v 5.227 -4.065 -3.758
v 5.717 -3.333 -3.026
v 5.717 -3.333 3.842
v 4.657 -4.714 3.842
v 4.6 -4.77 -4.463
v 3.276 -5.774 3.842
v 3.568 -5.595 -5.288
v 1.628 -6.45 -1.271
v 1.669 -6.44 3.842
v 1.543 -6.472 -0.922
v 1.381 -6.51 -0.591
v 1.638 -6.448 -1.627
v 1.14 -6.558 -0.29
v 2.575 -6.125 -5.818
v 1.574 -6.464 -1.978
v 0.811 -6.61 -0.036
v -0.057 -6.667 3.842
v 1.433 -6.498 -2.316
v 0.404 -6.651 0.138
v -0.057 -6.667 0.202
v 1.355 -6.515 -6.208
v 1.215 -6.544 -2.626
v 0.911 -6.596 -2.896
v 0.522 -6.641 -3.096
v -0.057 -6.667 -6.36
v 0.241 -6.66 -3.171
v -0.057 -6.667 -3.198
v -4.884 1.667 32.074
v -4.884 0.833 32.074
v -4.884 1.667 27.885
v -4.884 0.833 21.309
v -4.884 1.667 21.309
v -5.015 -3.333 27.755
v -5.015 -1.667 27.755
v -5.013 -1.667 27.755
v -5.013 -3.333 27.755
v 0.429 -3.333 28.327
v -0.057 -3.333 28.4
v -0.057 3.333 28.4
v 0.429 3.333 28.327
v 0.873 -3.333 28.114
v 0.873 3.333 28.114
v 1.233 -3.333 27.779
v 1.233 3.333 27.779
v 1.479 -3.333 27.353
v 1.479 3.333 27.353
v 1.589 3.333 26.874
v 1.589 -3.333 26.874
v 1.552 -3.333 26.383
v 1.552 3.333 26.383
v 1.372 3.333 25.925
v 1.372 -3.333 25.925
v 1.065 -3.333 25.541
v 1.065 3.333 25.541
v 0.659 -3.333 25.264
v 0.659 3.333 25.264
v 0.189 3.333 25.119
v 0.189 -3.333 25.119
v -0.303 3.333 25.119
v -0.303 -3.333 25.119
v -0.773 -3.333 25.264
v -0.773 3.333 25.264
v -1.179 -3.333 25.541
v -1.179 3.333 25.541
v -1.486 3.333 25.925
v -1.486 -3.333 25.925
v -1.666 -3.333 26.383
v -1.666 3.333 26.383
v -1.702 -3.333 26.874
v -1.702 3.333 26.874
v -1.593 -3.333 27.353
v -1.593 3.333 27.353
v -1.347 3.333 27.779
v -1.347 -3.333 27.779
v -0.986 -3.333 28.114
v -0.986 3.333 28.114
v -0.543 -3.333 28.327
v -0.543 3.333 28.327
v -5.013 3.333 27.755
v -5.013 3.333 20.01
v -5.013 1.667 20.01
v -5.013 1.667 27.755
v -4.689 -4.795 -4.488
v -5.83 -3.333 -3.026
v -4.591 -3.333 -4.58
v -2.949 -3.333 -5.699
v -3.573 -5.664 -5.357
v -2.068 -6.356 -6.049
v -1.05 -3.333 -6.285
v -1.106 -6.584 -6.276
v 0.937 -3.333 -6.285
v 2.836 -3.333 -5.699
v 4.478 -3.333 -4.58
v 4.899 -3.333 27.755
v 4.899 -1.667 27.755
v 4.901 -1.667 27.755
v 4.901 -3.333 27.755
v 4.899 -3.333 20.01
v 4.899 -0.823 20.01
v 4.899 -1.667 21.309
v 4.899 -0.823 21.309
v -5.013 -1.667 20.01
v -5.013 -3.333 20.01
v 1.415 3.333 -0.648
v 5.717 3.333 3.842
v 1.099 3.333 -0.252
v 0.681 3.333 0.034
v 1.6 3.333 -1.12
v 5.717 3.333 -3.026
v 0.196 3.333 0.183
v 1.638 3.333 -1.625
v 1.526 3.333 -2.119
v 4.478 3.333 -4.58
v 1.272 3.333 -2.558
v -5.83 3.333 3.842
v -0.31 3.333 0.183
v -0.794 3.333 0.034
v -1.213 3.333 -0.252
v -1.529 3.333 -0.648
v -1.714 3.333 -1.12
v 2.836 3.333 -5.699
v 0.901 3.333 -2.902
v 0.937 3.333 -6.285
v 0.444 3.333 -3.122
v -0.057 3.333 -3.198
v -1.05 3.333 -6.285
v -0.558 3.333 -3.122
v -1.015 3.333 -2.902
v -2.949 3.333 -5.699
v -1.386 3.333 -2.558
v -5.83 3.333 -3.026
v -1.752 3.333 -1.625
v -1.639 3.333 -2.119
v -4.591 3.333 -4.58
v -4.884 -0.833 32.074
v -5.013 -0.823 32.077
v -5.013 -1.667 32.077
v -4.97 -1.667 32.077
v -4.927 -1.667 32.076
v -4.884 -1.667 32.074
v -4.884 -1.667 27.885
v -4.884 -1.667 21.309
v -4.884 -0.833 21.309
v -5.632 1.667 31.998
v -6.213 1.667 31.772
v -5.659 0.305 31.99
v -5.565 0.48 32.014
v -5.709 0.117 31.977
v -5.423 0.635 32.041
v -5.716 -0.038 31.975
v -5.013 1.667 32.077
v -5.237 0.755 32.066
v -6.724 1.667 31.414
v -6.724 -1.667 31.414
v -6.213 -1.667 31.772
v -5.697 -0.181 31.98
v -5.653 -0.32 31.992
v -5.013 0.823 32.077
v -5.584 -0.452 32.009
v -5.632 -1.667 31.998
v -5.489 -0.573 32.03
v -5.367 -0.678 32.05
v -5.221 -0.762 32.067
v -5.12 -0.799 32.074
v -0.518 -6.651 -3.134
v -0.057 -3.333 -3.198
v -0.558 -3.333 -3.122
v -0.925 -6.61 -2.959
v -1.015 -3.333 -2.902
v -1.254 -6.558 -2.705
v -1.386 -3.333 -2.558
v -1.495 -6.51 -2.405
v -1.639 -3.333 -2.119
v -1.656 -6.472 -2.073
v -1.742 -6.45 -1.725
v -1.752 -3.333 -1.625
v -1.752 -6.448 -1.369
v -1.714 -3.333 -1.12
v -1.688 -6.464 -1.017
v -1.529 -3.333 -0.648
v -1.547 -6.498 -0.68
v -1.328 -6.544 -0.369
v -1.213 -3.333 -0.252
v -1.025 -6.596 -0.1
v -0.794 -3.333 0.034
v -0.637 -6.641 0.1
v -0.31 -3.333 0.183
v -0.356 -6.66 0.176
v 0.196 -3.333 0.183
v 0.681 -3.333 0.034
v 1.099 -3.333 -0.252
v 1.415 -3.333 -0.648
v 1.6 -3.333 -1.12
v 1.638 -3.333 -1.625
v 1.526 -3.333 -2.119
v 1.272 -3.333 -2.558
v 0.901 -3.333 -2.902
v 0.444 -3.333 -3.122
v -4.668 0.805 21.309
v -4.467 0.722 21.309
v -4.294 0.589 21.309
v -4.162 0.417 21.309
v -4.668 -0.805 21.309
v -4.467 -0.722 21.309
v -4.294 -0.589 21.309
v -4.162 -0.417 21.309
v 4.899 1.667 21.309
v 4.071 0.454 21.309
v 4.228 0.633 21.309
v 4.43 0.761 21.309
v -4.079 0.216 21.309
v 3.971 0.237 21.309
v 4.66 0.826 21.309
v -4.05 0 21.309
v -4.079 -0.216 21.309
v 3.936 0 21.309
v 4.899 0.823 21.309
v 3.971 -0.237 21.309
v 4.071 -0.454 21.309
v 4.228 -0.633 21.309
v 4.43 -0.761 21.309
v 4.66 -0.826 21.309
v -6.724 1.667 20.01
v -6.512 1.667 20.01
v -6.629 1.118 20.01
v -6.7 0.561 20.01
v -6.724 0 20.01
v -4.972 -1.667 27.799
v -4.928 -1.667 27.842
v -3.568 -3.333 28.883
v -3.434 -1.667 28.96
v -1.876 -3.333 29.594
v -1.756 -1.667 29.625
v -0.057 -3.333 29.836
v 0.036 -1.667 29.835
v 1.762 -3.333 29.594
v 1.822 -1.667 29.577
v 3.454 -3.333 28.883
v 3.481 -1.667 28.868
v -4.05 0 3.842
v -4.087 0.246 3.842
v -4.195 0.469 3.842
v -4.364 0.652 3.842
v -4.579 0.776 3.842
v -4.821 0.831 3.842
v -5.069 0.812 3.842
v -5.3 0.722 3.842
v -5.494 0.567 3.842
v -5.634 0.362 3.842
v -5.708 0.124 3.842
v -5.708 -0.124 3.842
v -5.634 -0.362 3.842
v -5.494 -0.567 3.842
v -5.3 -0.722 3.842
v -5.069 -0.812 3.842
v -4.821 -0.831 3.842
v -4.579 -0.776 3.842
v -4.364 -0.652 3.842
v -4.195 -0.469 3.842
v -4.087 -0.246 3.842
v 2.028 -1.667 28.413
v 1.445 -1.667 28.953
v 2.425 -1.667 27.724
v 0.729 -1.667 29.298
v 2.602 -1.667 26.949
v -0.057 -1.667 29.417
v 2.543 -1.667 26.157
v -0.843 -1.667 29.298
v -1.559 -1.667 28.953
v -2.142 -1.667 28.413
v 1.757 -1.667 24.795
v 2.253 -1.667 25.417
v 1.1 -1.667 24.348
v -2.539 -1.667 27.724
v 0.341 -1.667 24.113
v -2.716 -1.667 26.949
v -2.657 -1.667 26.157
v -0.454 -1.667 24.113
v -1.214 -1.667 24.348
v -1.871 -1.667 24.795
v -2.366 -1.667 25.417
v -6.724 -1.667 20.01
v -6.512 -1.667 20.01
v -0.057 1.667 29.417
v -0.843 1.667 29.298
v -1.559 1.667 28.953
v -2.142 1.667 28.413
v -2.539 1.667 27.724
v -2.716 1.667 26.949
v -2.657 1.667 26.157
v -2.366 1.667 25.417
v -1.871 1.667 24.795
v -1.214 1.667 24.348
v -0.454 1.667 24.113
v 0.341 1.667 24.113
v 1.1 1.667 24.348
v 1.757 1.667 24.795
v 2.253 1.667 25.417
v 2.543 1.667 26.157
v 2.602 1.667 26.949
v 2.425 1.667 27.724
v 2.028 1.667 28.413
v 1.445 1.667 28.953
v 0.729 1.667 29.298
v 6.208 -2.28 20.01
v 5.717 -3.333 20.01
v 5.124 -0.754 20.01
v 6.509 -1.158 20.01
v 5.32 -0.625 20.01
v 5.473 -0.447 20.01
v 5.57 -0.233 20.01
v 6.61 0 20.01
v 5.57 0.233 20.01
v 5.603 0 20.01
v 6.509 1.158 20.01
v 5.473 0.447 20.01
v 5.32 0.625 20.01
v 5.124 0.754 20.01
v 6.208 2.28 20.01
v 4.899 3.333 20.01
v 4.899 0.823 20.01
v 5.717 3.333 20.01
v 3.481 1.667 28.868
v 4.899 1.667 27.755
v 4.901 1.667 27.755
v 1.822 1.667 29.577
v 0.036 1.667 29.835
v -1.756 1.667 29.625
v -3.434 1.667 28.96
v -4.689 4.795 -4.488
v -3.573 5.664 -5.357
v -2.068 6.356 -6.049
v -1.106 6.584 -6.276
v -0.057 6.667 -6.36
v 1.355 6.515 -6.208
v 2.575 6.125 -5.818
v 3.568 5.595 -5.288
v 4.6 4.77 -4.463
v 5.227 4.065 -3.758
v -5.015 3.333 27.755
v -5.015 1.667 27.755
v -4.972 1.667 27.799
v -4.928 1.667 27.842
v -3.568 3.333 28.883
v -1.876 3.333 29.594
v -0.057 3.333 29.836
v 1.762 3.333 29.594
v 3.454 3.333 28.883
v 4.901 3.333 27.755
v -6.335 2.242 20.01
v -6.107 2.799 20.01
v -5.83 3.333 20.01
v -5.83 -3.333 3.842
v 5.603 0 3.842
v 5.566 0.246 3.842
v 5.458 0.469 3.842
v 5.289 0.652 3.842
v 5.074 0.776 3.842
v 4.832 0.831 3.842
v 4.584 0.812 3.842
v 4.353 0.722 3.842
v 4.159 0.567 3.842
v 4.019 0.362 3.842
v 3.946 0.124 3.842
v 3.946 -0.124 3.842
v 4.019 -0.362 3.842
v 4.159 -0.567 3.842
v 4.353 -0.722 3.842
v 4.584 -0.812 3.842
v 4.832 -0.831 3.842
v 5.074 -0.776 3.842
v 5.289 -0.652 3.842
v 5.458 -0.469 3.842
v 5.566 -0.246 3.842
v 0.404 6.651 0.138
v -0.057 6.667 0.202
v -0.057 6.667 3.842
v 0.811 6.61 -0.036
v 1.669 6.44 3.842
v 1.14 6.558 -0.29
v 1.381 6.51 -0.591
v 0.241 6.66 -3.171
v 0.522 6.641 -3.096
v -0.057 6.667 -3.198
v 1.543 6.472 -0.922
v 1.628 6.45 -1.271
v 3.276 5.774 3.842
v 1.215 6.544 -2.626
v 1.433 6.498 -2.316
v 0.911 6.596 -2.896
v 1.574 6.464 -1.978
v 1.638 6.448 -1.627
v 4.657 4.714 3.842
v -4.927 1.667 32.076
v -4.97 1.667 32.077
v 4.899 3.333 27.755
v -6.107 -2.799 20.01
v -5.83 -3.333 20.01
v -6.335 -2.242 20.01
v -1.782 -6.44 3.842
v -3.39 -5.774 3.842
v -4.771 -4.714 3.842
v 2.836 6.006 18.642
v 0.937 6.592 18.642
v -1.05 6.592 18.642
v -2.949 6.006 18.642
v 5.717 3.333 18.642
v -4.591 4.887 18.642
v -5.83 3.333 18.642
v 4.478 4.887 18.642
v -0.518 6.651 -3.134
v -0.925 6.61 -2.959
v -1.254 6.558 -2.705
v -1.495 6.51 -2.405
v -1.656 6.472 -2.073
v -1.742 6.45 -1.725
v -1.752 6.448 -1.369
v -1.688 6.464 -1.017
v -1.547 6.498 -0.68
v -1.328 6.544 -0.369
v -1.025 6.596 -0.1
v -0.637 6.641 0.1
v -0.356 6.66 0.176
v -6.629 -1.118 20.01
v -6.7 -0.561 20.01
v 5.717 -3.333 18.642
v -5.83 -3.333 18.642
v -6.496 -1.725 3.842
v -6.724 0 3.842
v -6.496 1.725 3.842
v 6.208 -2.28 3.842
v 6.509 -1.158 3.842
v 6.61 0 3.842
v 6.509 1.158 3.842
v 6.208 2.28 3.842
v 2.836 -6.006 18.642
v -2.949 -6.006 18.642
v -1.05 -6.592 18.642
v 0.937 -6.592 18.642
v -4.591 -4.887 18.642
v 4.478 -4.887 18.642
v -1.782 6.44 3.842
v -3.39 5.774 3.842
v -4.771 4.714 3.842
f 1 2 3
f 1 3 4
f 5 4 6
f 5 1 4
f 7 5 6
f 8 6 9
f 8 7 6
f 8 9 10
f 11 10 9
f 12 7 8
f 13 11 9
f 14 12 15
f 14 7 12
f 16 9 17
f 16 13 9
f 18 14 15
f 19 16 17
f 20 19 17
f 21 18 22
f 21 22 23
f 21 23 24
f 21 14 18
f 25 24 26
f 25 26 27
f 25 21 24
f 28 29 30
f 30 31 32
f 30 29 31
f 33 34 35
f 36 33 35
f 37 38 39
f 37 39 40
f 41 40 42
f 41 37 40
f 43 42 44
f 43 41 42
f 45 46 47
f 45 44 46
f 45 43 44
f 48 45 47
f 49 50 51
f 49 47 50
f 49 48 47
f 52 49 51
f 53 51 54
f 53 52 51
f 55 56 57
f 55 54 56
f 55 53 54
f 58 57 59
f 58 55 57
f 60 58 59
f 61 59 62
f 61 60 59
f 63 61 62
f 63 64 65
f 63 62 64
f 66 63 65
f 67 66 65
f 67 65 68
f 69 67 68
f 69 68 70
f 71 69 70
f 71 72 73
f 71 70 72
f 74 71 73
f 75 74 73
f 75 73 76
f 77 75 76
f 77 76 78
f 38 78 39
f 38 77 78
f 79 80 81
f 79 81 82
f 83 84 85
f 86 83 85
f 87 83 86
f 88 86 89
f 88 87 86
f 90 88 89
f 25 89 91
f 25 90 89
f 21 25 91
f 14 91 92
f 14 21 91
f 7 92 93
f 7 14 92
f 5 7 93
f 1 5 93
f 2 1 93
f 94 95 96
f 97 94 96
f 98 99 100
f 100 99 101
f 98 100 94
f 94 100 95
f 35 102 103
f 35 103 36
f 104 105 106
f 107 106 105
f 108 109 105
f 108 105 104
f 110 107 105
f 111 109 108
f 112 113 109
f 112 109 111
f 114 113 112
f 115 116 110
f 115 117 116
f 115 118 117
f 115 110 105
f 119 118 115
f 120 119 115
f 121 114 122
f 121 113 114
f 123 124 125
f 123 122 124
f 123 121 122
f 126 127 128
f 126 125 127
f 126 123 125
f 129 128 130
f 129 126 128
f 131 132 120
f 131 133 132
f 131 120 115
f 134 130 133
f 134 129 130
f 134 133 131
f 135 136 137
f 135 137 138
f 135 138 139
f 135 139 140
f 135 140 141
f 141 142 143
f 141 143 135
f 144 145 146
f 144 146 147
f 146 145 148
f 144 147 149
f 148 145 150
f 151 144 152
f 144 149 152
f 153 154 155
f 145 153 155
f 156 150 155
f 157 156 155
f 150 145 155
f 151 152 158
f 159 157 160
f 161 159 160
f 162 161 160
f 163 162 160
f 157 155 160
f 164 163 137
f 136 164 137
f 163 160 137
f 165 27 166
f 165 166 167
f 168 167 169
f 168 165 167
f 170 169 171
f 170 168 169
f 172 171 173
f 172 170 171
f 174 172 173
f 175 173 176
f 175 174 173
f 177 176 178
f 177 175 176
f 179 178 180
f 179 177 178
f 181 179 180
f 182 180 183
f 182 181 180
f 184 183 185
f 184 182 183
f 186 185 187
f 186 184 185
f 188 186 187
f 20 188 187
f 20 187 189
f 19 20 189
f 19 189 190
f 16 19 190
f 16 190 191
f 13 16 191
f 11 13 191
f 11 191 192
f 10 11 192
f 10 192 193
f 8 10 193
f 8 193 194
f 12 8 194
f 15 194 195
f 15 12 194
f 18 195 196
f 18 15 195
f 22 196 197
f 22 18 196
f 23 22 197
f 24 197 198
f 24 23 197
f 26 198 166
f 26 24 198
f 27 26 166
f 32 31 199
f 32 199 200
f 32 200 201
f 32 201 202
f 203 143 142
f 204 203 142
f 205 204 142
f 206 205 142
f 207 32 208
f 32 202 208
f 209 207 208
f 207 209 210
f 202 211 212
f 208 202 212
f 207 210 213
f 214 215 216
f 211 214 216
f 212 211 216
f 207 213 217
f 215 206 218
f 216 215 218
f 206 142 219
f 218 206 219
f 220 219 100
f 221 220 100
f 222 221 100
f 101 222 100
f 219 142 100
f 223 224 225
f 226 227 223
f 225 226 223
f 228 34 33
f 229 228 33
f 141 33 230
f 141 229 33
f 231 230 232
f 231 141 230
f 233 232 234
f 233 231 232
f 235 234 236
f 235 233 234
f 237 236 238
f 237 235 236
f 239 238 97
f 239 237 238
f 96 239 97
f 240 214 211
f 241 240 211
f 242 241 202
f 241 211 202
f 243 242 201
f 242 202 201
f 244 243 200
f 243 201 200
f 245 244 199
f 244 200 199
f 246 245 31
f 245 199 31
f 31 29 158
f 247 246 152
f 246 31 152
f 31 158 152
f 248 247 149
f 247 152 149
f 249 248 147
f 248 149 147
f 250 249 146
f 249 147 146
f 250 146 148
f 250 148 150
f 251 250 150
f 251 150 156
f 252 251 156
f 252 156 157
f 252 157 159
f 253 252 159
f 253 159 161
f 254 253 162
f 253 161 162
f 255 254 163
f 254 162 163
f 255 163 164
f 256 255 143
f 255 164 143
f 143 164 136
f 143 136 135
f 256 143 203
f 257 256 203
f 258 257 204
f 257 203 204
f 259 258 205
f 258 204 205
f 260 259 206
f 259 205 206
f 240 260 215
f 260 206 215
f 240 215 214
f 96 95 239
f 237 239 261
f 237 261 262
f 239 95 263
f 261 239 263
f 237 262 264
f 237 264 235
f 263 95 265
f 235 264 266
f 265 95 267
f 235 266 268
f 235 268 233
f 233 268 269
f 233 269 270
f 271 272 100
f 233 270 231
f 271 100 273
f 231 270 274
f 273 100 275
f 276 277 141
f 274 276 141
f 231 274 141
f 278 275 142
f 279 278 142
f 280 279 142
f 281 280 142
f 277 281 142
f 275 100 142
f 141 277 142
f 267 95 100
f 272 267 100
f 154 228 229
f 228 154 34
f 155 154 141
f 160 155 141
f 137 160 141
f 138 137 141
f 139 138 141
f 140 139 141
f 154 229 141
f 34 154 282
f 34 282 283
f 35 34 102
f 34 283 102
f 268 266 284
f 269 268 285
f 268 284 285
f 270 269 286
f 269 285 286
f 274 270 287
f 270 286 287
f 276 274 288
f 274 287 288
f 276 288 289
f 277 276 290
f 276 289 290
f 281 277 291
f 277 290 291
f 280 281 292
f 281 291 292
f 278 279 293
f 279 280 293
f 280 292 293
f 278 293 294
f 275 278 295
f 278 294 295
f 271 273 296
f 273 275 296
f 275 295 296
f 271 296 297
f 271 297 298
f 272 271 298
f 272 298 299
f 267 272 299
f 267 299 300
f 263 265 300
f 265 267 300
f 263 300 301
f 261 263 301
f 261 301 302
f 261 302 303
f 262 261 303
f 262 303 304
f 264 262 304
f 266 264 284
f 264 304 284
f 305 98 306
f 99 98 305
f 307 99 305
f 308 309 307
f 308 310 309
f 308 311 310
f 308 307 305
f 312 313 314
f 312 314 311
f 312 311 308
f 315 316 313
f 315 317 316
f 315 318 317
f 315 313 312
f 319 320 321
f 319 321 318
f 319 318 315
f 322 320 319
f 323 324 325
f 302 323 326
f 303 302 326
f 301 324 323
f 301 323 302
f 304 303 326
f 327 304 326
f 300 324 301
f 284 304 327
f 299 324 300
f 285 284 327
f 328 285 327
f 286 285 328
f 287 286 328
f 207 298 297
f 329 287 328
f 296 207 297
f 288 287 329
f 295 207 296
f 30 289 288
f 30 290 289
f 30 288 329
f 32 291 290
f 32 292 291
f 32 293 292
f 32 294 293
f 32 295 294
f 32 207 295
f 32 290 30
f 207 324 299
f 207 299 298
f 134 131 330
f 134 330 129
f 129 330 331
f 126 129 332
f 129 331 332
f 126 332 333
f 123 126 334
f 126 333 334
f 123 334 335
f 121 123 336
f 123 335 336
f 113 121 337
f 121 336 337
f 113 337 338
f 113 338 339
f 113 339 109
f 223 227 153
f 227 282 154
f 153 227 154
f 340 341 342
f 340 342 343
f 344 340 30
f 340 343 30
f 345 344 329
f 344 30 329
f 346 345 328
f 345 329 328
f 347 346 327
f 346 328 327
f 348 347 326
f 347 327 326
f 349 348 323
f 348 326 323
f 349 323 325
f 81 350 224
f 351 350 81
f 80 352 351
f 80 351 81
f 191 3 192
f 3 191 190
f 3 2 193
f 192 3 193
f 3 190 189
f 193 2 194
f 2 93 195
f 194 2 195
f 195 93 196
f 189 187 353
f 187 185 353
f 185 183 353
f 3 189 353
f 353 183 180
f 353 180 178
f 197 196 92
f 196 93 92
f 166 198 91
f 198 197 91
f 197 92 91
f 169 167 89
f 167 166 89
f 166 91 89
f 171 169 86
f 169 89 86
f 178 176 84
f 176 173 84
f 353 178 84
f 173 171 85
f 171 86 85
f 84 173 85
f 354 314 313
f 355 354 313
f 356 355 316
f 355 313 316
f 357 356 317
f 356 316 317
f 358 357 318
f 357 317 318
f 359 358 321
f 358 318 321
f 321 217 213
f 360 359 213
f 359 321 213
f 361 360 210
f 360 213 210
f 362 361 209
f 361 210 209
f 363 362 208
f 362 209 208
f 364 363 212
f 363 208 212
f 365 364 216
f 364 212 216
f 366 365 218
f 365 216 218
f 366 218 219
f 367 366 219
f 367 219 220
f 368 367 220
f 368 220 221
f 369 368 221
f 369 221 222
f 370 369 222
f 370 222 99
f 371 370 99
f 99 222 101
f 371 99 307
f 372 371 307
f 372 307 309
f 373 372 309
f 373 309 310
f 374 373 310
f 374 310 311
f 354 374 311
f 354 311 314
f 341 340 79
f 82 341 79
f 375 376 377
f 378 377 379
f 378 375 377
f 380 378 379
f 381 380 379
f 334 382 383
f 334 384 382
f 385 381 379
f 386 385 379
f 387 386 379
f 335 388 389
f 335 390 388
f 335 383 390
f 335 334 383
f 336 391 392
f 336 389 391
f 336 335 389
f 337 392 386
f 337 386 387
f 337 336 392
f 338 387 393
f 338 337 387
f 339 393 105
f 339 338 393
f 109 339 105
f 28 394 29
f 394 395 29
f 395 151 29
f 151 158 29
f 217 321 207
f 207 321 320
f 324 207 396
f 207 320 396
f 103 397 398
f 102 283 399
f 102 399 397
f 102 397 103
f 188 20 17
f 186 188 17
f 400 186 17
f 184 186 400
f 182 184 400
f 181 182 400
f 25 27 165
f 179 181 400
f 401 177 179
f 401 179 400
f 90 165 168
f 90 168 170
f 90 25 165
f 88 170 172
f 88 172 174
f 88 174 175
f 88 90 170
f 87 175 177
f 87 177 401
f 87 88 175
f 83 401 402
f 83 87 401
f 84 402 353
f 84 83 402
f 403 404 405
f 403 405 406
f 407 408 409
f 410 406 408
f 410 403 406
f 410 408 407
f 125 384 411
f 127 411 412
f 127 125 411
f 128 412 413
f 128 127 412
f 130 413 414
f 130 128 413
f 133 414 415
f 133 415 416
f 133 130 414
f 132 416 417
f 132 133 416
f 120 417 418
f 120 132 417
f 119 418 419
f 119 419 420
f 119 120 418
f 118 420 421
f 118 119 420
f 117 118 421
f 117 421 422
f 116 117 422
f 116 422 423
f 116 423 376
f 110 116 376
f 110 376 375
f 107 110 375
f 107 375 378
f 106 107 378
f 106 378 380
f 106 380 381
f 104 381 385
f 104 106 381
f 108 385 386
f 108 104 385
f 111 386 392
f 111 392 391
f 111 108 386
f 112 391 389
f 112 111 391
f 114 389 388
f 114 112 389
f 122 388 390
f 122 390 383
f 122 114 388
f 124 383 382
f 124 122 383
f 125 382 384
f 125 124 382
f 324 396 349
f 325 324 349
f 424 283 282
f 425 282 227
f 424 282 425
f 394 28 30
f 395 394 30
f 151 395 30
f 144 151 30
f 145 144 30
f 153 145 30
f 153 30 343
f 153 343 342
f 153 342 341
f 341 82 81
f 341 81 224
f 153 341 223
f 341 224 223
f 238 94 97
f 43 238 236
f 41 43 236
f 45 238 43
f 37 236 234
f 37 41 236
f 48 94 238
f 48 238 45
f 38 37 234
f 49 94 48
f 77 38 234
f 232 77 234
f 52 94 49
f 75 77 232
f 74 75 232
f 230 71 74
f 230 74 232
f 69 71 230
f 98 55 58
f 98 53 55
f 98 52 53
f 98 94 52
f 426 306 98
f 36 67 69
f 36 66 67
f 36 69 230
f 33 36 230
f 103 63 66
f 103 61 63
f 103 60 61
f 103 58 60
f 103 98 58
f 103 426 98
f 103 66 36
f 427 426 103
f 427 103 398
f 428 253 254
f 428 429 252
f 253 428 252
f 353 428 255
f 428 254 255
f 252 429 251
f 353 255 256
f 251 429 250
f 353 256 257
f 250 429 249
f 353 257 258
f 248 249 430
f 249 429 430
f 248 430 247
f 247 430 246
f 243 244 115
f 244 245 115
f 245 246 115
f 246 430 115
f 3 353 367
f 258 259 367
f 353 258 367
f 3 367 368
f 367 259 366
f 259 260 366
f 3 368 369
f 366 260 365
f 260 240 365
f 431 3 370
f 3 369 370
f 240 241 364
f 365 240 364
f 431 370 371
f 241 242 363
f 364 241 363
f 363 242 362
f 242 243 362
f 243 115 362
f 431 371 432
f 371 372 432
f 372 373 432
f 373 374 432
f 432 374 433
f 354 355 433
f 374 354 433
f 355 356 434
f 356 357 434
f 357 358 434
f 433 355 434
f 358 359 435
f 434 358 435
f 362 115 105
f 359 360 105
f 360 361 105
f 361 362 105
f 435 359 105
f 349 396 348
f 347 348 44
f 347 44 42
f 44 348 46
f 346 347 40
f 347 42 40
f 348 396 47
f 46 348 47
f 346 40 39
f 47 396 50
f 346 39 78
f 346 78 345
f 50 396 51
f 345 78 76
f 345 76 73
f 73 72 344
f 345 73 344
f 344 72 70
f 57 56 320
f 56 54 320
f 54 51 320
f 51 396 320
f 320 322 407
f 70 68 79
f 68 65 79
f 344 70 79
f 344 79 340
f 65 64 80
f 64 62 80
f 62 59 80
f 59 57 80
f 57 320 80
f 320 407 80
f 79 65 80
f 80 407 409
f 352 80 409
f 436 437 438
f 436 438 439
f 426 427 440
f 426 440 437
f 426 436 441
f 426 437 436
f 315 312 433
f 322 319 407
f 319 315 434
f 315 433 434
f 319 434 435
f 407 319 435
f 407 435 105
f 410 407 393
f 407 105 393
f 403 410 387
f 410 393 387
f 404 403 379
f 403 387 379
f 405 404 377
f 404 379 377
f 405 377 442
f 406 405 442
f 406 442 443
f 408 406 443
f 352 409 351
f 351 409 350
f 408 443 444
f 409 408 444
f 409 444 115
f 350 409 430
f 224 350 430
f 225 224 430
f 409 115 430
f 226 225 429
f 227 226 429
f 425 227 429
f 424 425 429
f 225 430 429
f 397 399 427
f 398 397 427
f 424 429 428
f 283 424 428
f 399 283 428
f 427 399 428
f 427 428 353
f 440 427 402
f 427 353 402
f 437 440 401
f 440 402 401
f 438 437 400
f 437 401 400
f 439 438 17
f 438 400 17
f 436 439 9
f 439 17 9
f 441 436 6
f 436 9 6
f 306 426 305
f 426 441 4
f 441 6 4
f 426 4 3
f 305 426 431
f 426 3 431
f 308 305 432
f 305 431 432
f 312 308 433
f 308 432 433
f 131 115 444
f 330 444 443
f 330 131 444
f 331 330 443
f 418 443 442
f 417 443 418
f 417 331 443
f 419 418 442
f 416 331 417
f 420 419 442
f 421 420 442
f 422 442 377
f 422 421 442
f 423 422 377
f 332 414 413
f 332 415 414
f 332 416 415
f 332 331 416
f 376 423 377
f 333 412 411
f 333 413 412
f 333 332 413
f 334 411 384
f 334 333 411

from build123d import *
from build123d.topology import SkipClean

# Parameters (mm, degrees)
SKETCH2_R                       = 10
PHALANGE_LENGTH_DEPTH           = 26.2
BOSS_EXTRUDE3_DEPTH             = 5
BOSS_EXTRUDE4_DEPTH             = 5
BOSS_EXTRUDE4_DEPTH_BACK        = 5
CUT_EXTRUDE2_START              = -15.3025
CUT_EXTRUDE2_DEPTH              = 15.3025
SKETCH7_R                       = 1.65
CUT_EXTRUDE3_DEPTH              = 10
CUT_EXTRUDE4_DEPTH              = 2.5
CUT_EXTRUDE4_DEPTH_BACK         = 2.5
CUT_EXTRUDE7_REACH              = 47.294
SKETCH4_R                       = 1.65
CUT_EXTRUDE7_DIRECTION_2_REACH  = 47.294
CUT_EXTRUDE_THIN1_START         = 26.2
CUT_EXTRUDE_THIN1_DEPTH         = 10.361670454
BOSS_EXTRUDE5_REACH             = 46.529
SKETCH9_R                       = 4
SKETCH9_R_2                     = 1.65
CUT_EXTRUDE8_REACH              = 45.846
SKETCH10_R                      = 1.25
CUT_EXTRUDE9_START              = -4
CUT_EXTRUDE9_DEPTH              = 4
CUT_EXTRUDE10_REACH             = 46.529
CUT_EXTRUDE10_DIRECTION_2_REACH = 46.529
CUT_EXTRUDE11_START             = -10
CUT_EXTRUDE11_OUTLINE_W         = 2.565773848
CUT_EXTRUDE11_OUTLINE_H         = 11.6166929
CUT_EXTRUDE11_DEPTH             = 10
BOSS_EXTRUDE7_REACH             = 44.149
CUT_EXTRUDE12_REACH             = 45.846
SKETCH10_2_R                    = 1.25
CUT_EXTRUDE12_DIRECTION_2_REACH = 45.846
SKETCH17_R                      = 1.25
SKETCH17_W                      = 2.42123439
SKETCH17_H                      = 5
CUT_EXTRUDE14_DEPTH             = 16.148519
SCALE1_SCALE                    = 0.666666667
CUT_EXTRUDE15_START             = -10.000004
SKETCH18_R                      = 1.65
CUT_EXTRUDE15_DEPTH             = 13.333342
CUT_EXTRUDE16_START             = -3.333333
SKETCH19_R                      = 1.7
CUT_EXTRUDE16_DEPTH             = 13.333338


# Read off the part's stored shape, not the designer's step: Cut-Extrude-Thin1, Cut-Extrude11
with BuildPart() as part:
    # Sketch2 → Phalange Length (new body)
    with BuildSketch(Plane.XY):
        Circle(SKETCH2_R)
    extrude(amount=PHALANGE_LENGTH_DEPTH)

    # Sketch3 → Boss-Extrude3 (add)
    with BuildSketch(Plane(origin=(0, -10, 0), x_dir=(-1, 0, 0), z_dir=(0, -1, 0))):
        with BuildLine():
            Line((-10, 5.302499701), (-10, 0))
            Line((-10, 0), (10, 0))
            Line((10, 0), (10, 5.302499701))
            ThreePointArc((10, 5.302499701), (0, 15.302499701), (-10, 5.302499701))
        make_face()
    boss_extrude3 = extrude(amount=-BOSS_EXTRUDE3_DEPTH)

    # Mirror1: Boss-Extrude3 across plane
    add(boss_extrude3.mirror(Plane.ZX))

    # Sketch5 → Boss-Extrude4 (add, two sides: drawn at the far end of the back side and taken through both)
    with BuildSketch(Plane(origin=(0, 0, 0), x_dir=(1, 0, 0), z_dir=(0, 1, 0)).offset(-BOSS_EXTRUDE4_DEPTH_BACK)):
        with BuildLine():
            Line((-10, -31.983157911), (-10, -26.2))
            Line((-10, -26.2), (10, -26.2))
            Line((10, -26.2), (10, -31.983157911))
            ThreePointArc((10, -31.983157911), (0, -41.551984156), (-10, -31.983157911))
        make_face()
    extrude(amount=BOSS_EXTRUDE4_DEPTH + BOSS_EXTRUDE4_DEPTH_BACK)

    # Sketch6 → Cut-Extrude2 (cut)
    with SkipClean():  # the faces are left unmerged after this step: merging them gives an invalid solid
        with BuildSketch(Plane.XY.offset(CUT_EXTRUDE2_START)):
            with BuildLine():
                ThreePointArc((0, 10), (5, 8.660254038), (8.660254038, 5))
                Line((8.660254038, 5), (10, 5))
                Line((10, 5), (10, 10))
                Line((10, 10), (0, 10))
            make_face()
            with BuildLine():
                Line((10, -5), (8.660254038, -5))
                ThreePointArc((8.660254038, -5), (5, -8.660254038), (0, -10))
                Line((0, -10), (10, -10))
                Line((10, -10), (10, -5))
            make_face()
            with BuildLine():
                ThreePointArc((-8.660254038, 5), (-5, 8.660254038), (0, 10))
                Line((0, 10), (-10, 10))
                Line((-10, 10), (-10, 5))
                Line((-10, 5), (-8.660254038, 5))
            make_face()
            with BuildLine():
                Line((-10, -10), (0, -10))
                ThreePointArc((0, -10), (-5, -8.660254038), (-8.660254038, -5))
                Line((-8.660254038, -5), (-10, -5))
                Line((-10, -5), (-10, -10))
            make_face()
        extrude(amount=CUT_EXTRUDE2_DEPTH, mode=Mode.SUBTRACT)

    # Sketch7 → Cut-Extrude3 (cut)
    with SkipClean():  # the faces are left unmerged after this step: merging them gives an invalid solid
        with BuildSketch(Plane(origin=(0, 5, 0), x_dir=(1, 0, 0), z_dir=(0, 1, 0))):
            with Locations(Location((0, -34.361984156, 0), (0, 0, 270))):
                Circle(SKETCH7_R)
        extrude(amount=-CUT_EXTRUDE3_DEPTH, mode=Mode.SUBTRACT)

    # Sketch5<2> → Cut-Extrude4 (cut, two sides: drawn at the far end of the back side and taken through both)
    with BuildSketch(Plane(origin=(0, 0, 0), x_dir=(1, 0, 0), z_dir=(0, 1, 0)).offset(-CUT_EXTRUDE4_DEPTH_BACK)):
        with BuildLine():
            Line((-10, -31.983157911), (-10, -26.2))
            Line((-10, -26.2), (10, -26.2))
            Line((10, -26.2), (10, -31.983157911))
            ThreePointArc((10, -31.983157911), (0, -41.551984156), (-10, -31.983157911))
        make_face()
    extrude(amount=CUT_EXTRUDE4_DEPTH + CUT_EXTRUDE4_DEPTH_BACK, mode=Mode.SUBTRACT)

    # Sketch4 → Cut-Extrude7 (cut, up to next)
    with BuildSketch(Plane(origin=(0, -5, 0), x_dir=(1, 0, 0), z_dir=(0, 1, 0)), mode=Mode.PRIVATE) as cut_extrude7_sk1:
        with Locations(Location((0, 8.010159673, 0), (0, 0, 270))):
            Circle(SKETCH4_R)
    cut_extrude7_tool1 = extrude(cut_extrude7_sk1.sketch, amount=-CUT_EXTRUDE7_REACH, mode=Mode.PRIVATE) & part.part
    add(cut_extrude7_tool1.solids().sort_by_distance((0, -5, -8.01016))[0], mode=Mode.SUBTRACT)

    # Sketch4 → Cut-Extrude7 direction 2 (cut, up to next)
    with BuildSketch(Plane(origin=(0, -5, 0), x_dir=(1, 0, 0), z_dir=(0, 1, 0)), mode=Mode.PRIVATE) as cut_extrude7_direction_2_sk1:
        with Locations(Location((0, 8.010159673, 0), (0, 0, 270))):
            Circle(SKETCH4_R)
    cut_extrude7_direction_2_tool1 = extrude(cut_extrude7_direction_2_sk1.sketch, amount=CUT_EXTRUDE7_DIRECTION_2_REACH, mode=Mode.PRIVATE) & part.part
    add(cut_extrude7_direction_2_tool1.solids().sort_by_distance((0, -5, -8.01016))[0], mode=Mode.SUBTRACT)

    # Cut-Extrude-Thin1 outline → Cut-Extrude-Thin1 (cut)
    with SkipClean():  # the faces are left unmerged after this step: merging them gives an invalid solid
        with BuildSketch(Plane.XY.offset(CUT_EXTRUDE_THIN1_START)):
            with BuildLine():
                ThreePointArc((8.660254038, 5), (9.256147934, 3.78466979), (9.682458366, 2.5))
                Line((9.682458366, 2.5), (10, 2.5))
                Line((10, 2.5), (10, 5))
                Line((10, 5), (8.660254038, 5))
            make_face()
            with BuildLine():
                Line((10, -2.5), (9.682458366, -2.5))
                ThreePointArc((9.682458366, -2.5), (9.256147934, -3.78466979), (8.660254038, -5))
                Line((8.660254038, -5), (10, -5))
                Line((10, -5), (10, -2.5))
            make_face()
            with BuildLine():
                Line((-10, 2.5), (-9.682458366, 2.5))
                ThreePointArc((-9.682458366, 2.5), (-9.256147934, 3.78466979), (-8.660254038, 5))
                Line((-8.660254038, 5), (-10, 5))
                Line((-10, 5), (-10, 2.5))
            make_face()
            with BuildLine():
                ThreePointArc((-8.660254038, -5), (-9.256147934, -3.78466979), (-9.682458366, -2.5))
                Line((-9.682458366, -2.5), (-10, -2.5))
                Line((-10, -2.5), (-10, -5))
                Line((-10, -5), (-8.660254038, -5))
            make_face()
        extrude(amount=CUT_EXTRUDE_THIN1_DEPTH, mode=Mode.SUBTRACT)

    # Sketch9 → Boss-Extrude5 (add, up to next)
    with BuildSketch(Plane.XZ.offset(-2.5), mode=Mode.PRIVATE) as boss_extrude5_sk1:
        with Locations(Location((0, 34.361984156, 0), (0, 0, 90))):
            Circle(SKETCH9_R)
        with Locations(Location((0, 34.361984156, 0), (0, 0, 90))):
            Circle(SKETCH9_R_2, mode=Mode.SUBTRACT)
    boss_extrude5_tool1 = extrude(boss_extrude5_sk1.sketch, amount=BOSS_EXTRUDE5_REACH, mode=Mode.PRIVATE) - part.part
    add(boss_extrude5_tool1.solids().sort_by_distance((0, 2.5, 30.475121))[0])

    # Sketch10 → Cut-Extrude8 (cut, up to next)
    with BuildSketch(Plane.XY.offset(26.2), mode=Mode.PRIVATE) as cut_extrude8_sk1:
        with Locations((7.239961745, 0)):
            Circle(SKETCH10_R)
    cut_extrude8_tool1 = extrude(cut_extrude8_sk1.sketch, amount=-CUT_EXTRUDE8_REACH, mode=Mode.PRIVATE) & part.part
    # Sketch10 → Cut-Extrude8 (cut, up to next)
    with BuildSketch(Plane.XY.offset(26.2), mode=Mode.PRIVATE) as cut_extrude8_sk2:
        with Locations((-7.239961745, 0)):
            Circle(SKETCH10_R)
    cut_extrude8_tool2 = extrude(cut_extrude8_sk2.sketch, amount=-CUT_EXTRUDE8_REACH, mode=Mode.PRIVATE) & part.part
    add(cut_extrude8_tool1.solids().sort_by_distance((7.239962, 0, 26.2))[0], mode=Mode.SUBTRACT)
    add(cut_extrude8_tool2.solids().sort_by_distance((-7.239962, 0, 26.2))[0], mode=Mode.SUBTRACT)

    # Sketch11 → Cut-Extrude9 (cut)
    with SkipClean():  # the faces are left unmerged after this step: merging them gives an invalid solid
        with BuildSketch(Plane.XY.offset(26.2).offset(CUT_EXTRUDE9_START)):
            with BuildLine():
                ThreePointArc((8.660254038, 5), (0, 10), (-8.660254038, 5))
                Line((-8.660254038, 5), (8.660254038, 5))
            make_face()
            with BuildLine():
                Line((8.660254038, -5), (-8.660254038, -5))
                ThreePointArc((-8.660254038, -5), (0, -10), (8.660254038, -5))
            make_face()
        extrude(amount=CUT_EXTRUDE9_DEPTH, mode=Mode.SUBTRACT)

    # Sketch12 → Cut-Extrude10 (cut, up to next)
    with BuildSketch(Plane.XZ.offset(-2.5), mode=Mode.PRIVATE) as cut_extrude10_sk1:
        with BuildLine():
            Line((-10.033719202, 41.551984156), (-10.033719202, 34.364892021))
            Line((-10.033719202, 34.364892021), (-8.660254038, 34.364892021))
            ThreePointArc((-8.660254038, 34.364892021), (0, 38.990740593), (8.660254038, 34.364892021))
            Line((8.660254038, 34.364892021), (10.033719202, 34.364892021))
            Line((10.033719202, 34.364892021), (10.033719202, 41.551984156))
            Line((10.033719202, 41.551984156), (-10.033719202, 41.551984156))
        make_face()
    cut_extrude10_tool1 = extrude(cut_extrude10_sk1.sketch, amount=CUT_EXTRUDE10_REACH, mode=Mode.PRIVATE) & part.part
    add(cut_extrude10_tool1.solids().sort_by_distance((0, 2.5, 39.050279))[0], mode=Mode.SUBTRACT)

    # Sketch12 → Cut-Extrude10 direction 2 (cut, up to next)
    with BuildSketch(Plane.XZ.offset(-2.5), mode=Mode.PRIVATE) as cut_extrude10_direction_2_sk1:
        with BuildLine():
            Line((-10.033719202, 41.551984156), (-10.033719202, 34.364892021))
            Line((-10.033719202, 34.364892021), (-8.660254038, 34.364892021))
            ThreePointArc((-8.660254038, 34.364892021), (0, 38.990740593), (8.660254038, 34.364892021))
            Line((8.660254038, 34.364892021), (10.033719202, 34.364892021))
            Line((10.033719202, 34.364892021), (10.033719202, 41.551984156))
            Line((10.033719202, 41.551984156), (-10.033719202, 41.551984156))
        make_face()
    cut_extrude10_direction_2_tool1 = extrude(cut_extrude10_direction_2_sk1.sketch, amount=-CUT_EXTRUDE10_DIRECTION_2_REACH, mode=Mode.PRIVATE) & part.part
    add(cut_extrude10_direction_2_tool1.solids().sort_by_distance((0, 2.5, 39.050279))[0], mode=Mode.SUBTRACT)

    # Cut-Extrude11 outline → Cut-Extrude11 (cut)
    with BuildSketch(Plane.XZ.offset(5).offset(CUT_EXTRUDE11_START)):
        with Locations((-8.717113076, 30.060571369)):
            Rectangle(CUT_EXTRUDE11_OUTLINE_W, CUT_EXTRUDE11_OUTLINE_H)
        with Locations((8.717113076, 30.060571369)):
            Rectangle(CUT_EXTRUDE11_OUTLINE_W, CUT_EXTRUDE11_OUTLINE_H)
    extrude(amount=CUT_EXTRUDE11_DEPTH, mode=Mode.SUBTRACT)

    # Boss-Extrude7: up to this face of the body (flat: up to its plane)
    boss_extrude7_end = Plane(part.part.faces().sort_by_distance((0, 2.5, 26.396174341))[0])
    # Sketch16 → Boss-Extrude7 (add, up to the picked face)
    with BuildSketch(Plane(origin=(0, -2.5, 0), x_dir=(1, 0, 0), z_dir=(0, 1, 0)), mode=Mode.PRIVATE) as boss_extrude7_sk1:
        with BuildLine():
            Line((-4.818727355, -24.252224919), (-7.434226152, -24.252224919))
            Line((-7.434226152, -24.252224919), (-10, -24.252224919))
            Line((-10, -24.252224919), (-10, -41.358561033))
            ThreePointArc((-10, -41.358561033), (-8.808295471, -42.090817912), (-7.43422564, -42.352145139))
            ThreePointArc((-7.43422564, -42.352145139), (-6.033645007, -42.099721533), (-4.818727355, -41.358561033))
            Line((-4.818727355, -41.358561033), (-4.818727355, -37.809527951))
            ThreePointArc((-4.818727355, -37.809527951), (-6.204248493, -36.942230104), (-7.437080645, -35.868917819))
            Line((-7.437080645, -35.868917819), (-7.434226152, -35.868917819))
            Line((-7.434226152, -35.868917819), (-7.434226152, -26.2))
            Line((-7.434226152, -26.2), (-4.818727355, -26.2))
            Line((-4.818727355, -26.2), (-4.818727355, -24.252224919))
        make_face()
    boss_extrude7_tool1 = split(extrude(boss_extrude7_sk1.sketch, amount=BOSS_EXTRUDE7_REACH, mode=Mode.PRIVATE), bisect_by=boss_extrude7_end, keep=Keep.BOTH, mode=Mode.PRIVATE)
    # Sketch16 → Boss-Extrude7 (add, up to the picked face)
    with BuildSketch(Plane(origin=(0, -2.5, 0), x_dir=(1, 0, 0), z_dir=(0, 1, 0)), mode=Mode.PRIVATE) as boss_extrude7_sk2:
        with BuildLine():
            Line((-4.818727355, -37.809527951), (-4.818727355, -26.2))
            Line((-4.818727355, -26.2), (-7.434226152, -26.2))
            Line((-7.434226152, -26.2), (-7.434226152, -35.868917819))
            Line((-7.434226152, -35.868917819), (-7.437080645, -35.868917819))
            ThreePointArc((-7.437080645, -35.868917819), (-6.204248493, -36.942230104), (-4.818727355, -37.809527951))
        make_face()
    boss_extrude7_tool2 = split(extrude(boss_extrude7_sk2.sketch, amount=BOSS_EXTRUDE7_REACH, mode=Mode.PRIVATE), bisect_by=boss_extrude7_end, keep=Keep.BOTH, mode=Mode.PRIVATE)
    add(boss_extrude7_tool1.solids().sort_by(Axis((-7.989429, -2.5, 33.833344), (0, 1, 0)))[0])
    add(boss_extrude7_tool2.solids().sort_by(Axis((-6.08748, -2.5, 31.5879), (0, 1, 0)))[0])

    # Sketch10<2> → Cut-Extrude12 (cut, up to next)
    with BuildSketch(Plane.XY.offset(26.2), mode=Mode.PRIVATE) as cut_extrude12_sk1:
        with Locations((-7.239961745, 0)):
            Circle(SKETCH10_2_R)
    cut_extrude12_tool1 = extrude(cut_extrude12_sk1.sketch, amount=CUT_EXTRUDE12_REACH, mode=Mode.PRIVATE) & part.part
    add(cut_extrude12_tool1.solids().sort_by_distance((-7.239962, 0, 26.2))[0], mode=Mode.SUBTRACT)

    # Sketch10<2> → Cut-Extrude12 direction 2 (cut, up to next)
    with BuildSketch(Plane.XY.offset(26.2), mode=Mode.PRIVATE) as cut_extrude12_direction_2_sk1:
        with Locations((-7.239961745, 0)):
            Circle(SKETCH10_2_R)
    cut_extrude12_direction_2_tool1 = extrude(cut_extrude12_direction_2_sk1.sketch, amount=-CUT_EXTRUDE12_DIRECTION_2_REACH, mode=Mode.PRIVATE) & part.part
    add(cut_extrude12_direction_2_tool1.solids().sort_by_distance((-7.239962, 0, 26.2))[0], mode=Mode.SUBTRACT)

    # Sketch17 → Cut-Extrude14 (cut)
    with SkipClean():  # the faces are left unmerged after this step: merging them gives an invalid solid
        with BuildSketch(Plane.XY.offset(26.2)):
            with Locations((-7.239961745, 0)):
                Circle(SKETCH17_R)
            with Locations((-6.02934455, 0)):
                Rectangle(SKETCH17_W, SKETCH17_H)
        extrude(amount=CUT_EXTRUDE14_DEPTH, mode=Mode.SUBTRACT)


with BuildPart() as part_1:
    # Scale1: scaled about (-0.170628715, -1.58e-07, 11.526321464)
    add(part.part.scale(SCALE1_SCALE).moved(Location((-0.056876238, -5.3e-08, 3.842107155))))

    # Sketch18 → Cut-Extrude15 (cut)
    with BuildSketch(Plane(origin=(0, 3.333328658, 0), x_dir=(1, 0, 0), z_dir=(0, 1, 0)).offset(CUT_EXTRUDE15_START)):
        with Locations(Location((-0.056884983, -26.750263395, 0), (0, 0, 270))):
            Circle(SKETCH18_R)
    extrude(amount=CUT_EXTRUDE15_DEPTH, mode=Mode.SUBTRACT)

    # Sketch19 → Cut-Extrude16 (cut)
    with BuildSketch(Plane(origin=(0, -3.333338008, 0), x_dir=(1, 0, 0), z_dir=(0, 1, 0)).offset(CUT_EXTRUDE16_START)):
        with Locations(Location((-0.056884983, 1.497832491, 0), (0, 0, 90))):
            Circle(SKETCH19_R)
    extrude(amount=CUT_EXTRUDE16_DEPTH, mode=Mode.SUBTRACT)


solid = part_1.part
